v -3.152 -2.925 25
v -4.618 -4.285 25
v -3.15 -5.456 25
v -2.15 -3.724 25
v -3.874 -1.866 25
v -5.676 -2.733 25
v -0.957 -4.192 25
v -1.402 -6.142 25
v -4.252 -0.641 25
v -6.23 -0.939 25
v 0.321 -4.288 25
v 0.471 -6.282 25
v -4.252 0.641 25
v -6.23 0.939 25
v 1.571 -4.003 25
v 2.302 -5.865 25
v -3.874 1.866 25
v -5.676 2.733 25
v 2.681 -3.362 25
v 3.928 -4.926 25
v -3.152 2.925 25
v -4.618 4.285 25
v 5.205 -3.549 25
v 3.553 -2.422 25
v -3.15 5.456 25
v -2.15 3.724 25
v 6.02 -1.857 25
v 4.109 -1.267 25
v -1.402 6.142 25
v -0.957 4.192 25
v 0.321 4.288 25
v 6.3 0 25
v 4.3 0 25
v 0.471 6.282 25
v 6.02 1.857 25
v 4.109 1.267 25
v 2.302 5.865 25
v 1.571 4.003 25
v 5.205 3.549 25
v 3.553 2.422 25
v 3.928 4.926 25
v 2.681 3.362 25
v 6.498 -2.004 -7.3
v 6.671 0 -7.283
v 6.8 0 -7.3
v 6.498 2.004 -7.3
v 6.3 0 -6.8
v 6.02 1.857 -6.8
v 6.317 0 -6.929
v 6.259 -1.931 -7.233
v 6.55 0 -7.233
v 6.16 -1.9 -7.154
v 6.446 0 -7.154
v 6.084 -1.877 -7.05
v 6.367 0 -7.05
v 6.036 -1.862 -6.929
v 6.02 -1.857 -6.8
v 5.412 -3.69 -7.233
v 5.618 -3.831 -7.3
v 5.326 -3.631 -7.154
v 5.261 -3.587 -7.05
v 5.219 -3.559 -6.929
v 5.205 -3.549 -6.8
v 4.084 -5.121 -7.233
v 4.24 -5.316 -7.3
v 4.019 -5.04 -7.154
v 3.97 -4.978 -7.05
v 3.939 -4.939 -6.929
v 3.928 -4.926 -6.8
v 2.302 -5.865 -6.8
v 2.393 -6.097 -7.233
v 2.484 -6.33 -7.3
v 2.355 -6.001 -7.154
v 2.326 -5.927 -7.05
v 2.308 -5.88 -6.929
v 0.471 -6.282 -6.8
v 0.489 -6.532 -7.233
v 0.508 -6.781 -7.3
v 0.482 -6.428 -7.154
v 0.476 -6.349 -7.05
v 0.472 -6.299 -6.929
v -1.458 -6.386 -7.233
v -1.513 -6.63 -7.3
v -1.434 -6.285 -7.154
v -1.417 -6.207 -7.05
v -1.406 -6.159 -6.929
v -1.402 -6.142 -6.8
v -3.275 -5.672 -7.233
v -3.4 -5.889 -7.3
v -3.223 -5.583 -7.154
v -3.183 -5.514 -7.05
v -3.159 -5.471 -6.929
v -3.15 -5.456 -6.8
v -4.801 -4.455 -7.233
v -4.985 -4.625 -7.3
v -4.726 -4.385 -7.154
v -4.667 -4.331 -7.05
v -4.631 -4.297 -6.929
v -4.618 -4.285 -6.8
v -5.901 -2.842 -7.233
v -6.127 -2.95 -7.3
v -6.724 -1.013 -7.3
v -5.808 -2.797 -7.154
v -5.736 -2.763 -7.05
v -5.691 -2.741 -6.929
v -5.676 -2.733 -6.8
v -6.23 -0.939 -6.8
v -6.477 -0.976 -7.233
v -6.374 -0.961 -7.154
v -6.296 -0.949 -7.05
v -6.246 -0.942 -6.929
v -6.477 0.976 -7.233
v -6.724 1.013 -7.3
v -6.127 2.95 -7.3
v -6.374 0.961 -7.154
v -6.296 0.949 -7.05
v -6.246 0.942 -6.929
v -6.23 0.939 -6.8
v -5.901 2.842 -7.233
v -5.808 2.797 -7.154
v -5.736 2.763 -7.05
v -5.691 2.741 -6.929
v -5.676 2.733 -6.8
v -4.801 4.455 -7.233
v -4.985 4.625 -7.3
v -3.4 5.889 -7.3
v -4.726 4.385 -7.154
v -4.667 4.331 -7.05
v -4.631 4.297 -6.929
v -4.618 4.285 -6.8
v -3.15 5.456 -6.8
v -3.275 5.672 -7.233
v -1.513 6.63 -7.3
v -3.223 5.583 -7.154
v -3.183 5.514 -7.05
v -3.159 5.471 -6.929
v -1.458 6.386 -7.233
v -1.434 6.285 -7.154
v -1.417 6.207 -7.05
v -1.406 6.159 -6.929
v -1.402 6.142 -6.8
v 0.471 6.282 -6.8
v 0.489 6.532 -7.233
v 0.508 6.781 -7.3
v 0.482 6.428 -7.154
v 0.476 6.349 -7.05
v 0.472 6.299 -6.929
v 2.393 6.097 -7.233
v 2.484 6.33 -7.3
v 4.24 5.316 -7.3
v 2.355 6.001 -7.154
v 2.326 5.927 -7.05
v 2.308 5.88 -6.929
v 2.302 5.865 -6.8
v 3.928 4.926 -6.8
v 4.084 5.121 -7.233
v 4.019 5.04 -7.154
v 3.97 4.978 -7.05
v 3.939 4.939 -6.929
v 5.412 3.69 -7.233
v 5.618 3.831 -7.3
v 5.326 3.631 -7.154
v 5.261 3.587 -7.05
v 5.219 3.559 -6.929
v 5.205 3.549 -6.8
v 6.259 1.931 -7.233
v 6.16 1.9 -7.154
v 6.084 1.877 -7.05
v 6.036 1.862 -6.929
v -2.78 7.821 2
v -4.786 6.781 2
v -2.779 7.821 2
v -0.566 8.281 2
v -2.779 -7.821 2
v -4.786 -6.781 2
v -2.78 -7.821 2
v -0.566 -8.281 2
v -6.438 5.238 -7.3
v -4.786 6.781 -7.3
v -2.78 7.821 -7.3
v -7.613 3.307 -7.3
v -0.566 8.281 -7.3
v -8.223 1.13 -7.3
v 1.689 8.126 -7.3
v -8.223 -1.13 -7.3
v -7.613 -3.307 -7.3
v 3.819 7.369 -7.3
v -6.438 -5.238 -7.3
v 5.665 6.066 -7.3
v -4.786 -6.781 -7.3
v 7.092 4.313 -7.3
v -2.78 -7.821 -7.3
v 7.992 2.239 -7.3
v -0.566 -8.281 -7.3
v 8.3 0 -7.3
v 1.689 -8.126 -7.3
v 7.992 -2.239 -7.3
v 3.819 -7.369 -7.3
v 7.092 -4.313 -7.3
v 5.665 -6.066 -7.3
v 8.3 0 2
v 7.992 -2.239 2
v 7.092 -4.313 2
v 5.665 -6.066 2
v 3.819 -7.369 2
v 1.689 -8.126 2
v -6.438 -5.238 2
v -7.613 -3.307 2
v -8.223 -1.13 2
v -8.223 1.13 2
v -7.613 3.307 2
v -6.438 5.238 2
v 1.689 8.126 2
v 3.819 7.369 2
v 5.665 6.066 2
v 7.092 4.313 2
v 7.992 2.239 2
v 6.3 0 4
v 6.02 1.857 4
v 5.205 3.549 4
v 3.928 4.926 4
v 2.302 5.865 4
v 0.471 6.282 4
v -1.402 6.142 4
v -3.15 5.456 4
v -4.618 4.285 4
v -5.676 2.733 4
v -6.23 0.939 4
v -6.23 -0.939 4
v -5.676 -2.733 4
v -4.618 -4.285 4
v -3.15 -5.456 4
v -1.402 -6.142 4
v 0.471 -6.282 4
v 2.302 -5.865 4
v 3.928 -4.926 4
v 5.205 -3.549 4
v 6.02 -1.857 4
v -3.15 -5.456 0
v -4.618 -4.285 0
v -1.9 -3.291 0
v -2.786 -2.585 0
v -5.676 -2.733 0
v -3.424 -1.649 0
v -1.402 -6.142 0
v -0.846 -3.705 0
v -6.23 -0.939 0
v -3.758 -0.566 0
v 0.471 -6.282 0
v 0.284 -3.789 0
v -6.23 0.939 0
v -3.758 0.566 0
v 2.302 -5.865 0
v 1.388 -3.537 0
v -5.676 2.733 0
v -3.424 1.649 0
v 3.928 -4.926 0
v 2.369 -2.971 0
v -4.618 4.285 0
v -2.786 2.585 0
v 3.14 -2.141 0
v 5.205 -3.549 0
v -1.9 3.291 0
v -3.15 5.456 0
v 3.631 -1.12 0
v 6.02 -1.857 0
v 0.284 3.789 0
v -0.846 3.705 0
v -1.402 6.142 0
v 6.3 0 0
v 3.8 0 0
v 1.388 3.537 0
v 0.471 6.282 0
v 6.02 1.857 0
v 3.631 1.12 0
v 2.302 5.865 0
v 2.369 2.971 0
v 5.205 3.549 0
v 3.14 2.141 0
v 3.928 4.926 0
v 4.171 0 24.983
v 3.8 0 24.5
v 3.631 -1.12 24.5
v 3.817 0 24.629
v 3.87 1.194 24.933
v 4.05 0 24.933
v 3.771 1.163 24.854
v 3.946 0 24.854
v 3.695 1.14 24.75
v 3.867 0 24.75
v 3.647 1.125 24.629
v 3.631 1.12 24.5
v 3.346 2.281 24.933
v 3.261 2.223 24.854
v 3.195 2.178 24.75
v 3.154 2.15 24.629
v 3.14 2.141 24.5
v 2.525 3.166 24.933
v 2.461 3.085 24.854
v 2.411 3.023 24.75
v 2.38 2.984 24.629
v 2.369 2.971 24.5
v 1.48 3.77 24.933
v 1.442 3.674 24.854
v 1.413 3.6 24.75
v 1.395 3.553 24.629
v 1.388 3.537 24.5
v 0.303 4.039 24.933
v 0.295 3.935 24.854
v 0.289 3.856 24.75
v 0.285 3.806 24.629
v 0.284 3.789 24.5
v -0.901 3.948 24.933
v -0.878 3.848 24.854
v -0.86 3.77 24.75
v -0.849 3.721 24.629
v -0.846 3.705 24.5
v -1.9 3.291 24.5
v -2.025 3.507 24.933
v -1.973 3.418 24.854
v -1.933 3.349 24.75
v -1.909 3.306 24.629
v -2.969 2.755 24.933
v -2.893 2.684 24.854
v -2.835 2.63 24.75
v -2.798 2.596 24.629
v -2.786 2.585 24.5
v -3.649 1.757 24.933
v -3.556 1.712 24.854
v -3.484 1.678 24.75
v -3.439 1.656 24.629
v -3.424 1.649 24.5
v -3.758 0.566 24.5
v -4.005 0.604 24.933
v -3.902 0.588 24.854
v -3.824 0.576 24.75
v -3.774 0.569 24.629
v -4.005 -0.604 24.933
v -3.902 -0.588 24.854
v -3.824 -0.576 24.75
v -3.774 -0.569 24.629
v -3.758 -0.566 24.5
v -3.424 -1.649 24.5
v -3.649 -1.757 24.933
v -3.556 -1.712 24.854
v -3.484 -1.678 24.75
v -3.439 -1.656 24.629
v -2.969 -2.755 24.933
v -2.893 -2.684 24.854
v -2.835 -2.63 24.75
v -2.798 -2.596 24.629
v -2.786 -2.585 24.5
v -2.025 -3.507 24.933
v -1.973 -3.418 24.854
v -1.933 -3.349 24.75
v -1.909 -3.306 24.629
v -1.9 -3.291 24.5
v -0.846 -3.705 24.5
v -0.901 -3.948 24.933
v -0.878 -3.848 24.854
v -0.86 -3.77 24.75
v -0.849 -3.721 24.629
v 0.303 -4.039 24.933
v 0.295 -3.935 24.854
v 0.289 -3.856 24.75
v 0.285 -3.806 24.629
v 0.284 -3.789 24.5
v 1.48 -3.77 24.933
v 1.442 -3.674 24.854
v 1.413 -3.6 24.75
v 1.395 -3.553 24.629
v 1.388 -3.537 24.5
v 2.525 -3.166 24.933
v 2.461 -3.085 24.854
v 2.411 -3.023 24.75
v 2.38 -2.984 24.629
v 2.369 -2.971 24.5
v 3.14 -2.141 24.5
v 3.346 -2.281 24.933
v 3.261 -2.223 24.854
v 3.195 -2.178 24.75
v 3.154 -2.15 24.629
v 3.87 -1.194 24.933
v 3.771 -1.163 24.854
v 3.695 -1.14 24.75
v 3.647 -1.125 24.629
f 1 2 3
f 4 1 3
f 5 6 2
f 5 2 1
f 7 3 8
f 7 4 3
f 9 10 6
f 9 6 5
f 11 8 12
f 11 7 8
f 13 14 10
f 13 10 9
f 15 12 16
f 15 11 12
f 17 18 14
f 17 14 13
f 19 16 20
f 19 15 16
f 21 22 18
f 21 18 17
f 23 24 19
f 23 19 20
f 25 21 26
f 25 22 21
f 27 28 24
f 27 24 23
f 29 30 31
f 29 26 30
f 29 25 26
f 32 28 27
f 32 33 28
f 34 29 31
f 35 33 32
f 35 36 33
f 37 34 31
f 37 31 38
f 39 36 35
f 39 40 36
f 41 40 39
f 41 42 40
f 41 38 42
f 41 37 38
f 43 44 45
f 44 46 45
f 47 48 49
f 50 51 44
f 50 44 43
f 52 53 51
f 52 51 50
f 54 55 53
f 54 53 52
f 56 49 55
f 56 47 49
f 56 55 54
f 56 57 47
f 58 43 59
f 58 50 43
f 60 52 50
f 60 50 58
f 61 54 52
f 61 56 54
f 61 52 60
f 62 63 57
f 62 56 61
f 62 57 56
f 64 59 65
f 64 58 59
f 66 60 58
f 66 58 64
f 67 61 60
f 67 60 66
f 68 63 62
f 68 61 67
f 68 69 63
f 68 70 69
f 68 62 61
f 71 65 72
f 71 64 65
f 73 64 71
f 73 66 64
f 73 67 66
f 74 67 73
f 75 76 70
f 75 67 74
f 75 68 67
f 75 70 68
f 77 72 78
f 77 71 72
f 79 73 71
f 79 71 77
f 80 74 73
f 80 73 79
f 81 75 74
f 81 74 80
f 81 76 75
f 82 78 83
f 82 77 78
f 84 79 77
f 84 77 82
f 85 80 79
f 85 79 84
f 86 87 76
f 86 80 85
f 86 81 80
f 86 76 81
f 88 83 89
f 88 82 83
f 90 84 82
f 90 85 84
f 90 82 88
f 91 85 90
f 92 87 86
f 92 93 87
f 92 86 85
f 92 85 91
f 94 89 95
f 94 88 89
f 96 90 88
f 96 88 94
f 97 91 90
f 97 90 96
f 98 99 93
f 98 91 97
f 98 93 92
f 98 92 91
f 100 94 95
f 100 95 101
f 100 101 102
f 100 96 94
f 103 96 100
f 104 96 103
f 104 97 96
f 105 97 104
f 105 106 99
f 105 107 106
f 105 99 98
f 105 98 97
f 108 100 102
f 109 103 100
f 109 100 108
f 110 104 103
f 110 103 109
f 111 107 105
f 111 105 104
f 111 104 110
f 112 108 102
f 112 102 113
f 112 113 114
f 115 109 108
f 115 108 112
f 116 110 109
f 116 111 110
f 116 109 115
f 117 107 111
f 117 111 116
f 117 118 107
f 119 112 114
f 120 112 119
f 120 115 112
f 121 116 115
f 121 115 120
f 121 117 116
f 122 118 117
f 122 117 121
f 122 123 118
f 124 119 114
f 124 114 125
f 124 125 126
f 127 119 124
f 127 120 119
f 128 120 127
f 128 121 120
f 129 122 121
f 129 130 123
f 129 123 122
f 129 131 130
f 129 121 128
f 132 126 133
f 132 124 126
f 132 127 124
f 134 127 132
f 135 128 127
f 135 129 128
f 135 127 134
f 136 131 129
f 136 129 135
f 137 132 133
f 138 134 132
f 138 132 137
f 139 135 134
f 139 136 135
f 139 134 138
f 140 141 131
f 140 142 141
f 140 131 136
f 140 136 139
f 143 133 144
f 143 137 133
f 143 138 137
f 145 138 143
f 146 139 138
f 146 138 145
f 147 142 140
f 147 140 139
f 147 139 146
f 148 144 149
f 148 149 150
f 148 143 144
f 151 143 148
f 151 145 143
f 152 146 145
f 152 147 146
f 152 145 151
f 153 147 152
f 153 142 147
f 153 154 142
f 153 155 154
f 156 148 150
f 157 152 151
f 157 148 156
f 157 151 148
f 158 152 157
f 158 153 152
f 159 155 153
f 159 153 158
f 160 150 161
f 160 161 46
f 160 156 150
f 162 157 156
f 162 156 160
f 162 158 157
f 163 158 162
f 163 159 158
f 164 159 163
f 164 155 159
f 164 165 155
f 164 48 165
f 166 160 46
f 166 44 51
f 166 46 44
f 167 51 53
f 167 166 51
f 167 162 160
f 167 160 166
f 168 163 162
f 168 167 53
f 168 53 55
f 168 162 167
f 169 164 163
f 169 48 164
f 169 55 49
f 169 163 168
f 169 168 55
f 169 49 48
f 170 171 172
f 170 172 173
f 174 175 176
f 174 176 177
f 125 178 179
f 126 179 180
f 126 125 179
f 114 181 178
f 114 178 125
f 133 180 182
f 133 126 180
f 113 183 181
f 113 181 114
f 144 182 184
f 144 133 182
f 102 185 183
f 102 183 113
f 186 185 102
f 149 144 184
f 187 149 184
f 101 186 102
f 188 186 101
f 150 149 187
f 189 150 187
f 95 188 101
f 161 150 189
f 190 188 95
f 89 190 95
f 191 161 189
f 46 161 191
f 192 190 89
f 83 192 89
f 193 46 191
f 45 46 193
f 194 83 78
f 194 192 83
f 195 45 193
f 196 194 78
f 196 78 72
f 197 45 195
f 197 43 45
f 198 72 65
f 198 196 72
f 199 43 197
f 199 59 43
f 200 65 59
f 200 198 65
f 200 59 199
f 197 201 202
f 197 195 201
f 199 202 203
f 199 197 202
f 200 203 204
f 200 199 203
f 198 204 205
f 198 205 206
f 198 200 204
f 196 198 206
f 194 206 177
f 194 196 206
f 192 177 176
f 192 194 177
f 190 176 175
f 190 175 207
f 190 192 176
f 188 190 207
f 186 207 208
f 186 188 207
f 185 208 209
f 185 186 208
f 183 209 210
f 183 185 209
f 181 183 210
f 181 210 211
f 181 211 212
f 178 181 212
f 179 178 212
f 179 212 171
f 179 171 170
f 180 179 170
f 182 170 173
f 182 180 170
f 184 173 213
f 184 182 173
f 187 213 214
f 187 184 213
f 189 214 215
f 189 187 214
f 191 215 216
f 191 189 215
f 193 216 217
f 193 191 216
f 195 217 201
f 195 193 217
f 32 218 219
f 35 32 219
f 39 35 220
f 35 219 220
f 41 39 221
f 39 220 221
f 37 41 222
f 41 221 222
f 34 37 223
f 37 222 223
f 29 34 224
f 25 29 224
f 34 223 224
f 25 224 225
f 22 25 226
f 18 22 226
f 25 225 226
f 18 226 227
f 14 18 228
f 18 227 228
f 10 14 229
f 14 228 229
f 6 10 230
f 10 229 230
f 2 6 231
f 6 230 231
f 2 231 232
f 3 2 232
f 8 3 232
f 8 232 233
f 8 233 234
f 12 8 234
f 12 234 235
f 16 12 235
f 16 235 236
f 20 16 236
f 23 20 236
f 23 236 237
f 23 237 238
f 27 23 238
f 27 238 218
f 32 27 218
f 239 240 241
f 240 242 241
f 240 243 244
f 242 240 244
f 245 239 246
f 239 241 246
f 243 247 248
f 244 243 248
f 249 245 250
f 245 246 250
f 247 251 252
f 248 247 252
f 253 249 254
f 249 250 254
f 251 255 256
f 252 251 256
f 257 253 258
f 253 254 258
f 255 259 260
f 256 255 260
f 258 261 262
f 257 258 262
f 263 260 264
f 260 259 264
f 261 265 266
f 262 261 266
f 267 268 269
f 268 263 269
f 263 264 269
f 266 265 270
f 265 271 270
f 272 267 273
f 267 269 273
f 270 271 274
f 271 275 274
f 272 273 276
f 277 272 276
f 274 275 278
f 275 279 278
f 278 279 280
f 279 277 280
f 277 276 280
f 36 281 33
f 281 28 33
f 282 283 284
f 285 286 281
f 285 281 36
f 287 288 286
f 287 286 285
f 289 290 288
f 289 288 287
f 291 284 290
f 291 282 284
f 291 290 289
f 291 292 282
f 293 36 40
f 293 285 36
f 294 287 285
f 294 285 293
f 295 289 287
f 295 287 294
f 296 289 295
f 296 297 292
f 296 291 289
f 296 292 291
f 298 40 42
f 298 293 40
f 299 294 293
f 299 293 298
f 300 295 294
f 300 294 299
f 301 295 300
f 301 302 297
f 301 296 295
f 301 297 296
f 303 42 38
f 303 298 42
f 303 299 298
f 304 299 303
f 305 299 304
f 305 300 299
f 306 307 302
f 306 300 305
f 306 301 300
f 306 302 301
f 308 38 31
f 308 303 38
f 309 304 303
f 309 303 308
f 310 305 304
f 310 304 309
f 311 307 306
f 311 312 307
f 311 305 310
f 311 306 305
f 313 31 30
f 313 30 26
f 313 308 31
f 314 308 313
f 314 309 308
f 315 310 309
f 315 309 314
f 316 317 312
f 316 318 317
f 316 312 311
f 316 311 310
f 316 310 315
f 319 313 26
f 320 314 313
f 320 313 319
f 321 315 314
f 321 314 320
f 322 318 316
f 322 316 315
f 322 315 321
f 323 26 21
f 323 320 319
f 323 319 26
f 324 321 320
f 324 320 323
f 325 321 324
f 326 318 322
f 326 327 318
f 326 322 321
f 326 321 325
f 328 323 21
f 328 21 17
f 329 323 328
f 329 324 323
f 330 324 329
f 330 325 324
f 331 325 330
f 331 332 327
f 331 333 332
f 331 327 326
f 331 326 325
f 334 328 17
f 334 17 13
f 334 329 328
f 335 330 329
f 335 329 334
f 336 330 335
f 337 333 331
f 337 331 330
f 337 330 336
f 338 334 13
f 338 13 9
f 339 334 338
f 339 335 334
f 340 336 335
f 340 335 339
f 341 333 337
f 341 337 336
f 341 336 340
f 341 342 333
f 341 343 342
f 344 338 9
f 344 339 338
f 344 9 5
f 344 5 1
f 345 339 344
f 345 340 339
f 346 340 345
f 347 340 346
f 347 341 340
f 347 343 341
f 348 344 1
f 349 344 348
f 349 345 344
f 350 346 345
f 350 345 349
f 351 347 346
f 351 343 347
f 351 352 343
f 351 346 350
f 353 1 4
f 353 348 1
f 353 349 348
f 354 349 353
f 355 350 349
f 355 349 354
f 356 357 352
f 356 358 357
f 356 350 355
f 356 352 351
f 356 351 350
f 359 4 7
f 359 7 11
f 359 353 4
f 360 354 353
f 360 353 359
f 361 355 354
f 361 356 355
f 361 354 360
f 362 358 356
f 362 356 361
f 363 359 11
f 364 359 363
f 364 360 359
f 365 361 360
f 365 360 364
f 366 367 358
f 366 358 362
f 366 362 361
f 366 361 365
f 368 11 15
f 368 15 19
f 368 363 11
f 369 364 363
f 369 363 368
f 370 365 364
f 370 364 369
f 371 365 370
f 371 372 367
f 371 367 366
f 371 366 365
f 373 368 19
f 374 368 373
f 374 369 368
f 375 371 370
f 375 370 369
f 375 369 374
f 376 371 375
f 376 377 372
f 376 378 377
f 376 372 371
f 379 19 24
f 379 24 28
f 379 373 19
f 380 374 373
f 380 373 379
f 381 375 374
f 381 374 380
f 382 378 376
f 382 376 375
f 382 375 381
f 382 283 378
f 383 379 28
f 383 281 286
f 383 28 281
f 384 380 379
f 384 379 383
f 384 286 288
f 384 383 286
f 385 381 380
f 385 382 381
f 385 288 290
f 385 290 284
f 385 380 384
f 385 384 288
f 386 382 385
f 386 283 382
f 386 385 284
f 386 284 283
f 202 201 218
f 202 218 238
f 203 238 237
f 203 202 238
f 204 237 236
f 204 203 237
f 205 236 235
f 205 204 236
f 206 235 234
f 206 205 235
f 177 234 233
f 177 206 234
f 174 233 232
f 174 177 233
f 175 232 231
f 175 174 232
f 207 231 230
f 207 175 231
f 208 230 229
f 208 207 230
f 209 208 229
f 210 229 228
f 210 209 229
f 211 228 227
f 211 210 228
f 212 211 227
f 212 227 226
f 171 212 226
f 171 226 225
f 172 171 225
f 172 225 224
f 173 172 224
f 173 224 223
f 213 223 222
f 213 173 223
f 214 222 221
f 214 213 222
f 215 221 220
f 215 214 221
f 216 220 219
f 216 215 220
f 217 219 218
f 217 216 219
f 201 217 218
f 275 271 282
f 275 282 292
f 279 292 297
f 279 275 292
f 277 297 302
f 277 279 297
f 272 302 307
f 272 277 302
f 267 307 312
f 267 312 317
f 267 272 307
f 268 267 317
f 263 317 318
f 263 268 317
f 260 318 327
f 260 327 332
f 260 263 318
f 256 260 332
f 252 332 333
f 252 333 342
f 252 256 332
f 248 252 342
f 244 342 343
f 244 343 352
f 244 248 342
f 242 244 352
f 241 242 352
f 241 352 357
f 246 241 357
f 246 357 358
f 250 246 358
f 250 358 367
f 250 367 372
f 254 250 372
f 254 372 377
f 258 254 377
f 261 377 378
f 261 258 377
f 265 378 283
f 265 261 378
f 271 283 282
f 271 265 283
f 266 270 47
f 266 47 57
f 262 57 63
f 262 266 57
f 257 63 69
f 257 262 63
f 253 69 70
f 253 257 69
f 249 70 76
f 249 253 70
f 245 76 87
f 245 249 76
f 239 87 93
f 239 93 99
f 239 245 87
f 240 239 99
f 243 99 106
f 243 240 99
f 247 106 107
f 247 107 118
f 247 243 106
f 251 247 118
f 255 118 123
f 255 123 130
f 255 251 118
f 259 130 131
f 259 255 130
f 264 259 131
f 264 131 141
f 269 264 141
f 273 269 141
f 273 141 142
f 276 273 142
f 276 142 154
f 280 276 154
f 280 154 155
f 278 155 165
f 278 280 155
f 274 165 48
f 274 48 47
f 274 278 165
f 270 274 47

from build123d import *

# Parameters (mm, degrees)
F0_R          = 6.3
F0_R_2        = 3.8
F1_DEPTH      = 25
F2_R          = 8.3
F2_R_2        = 6.3
F3_DEPTH      = 7.3
F3_DEPTH_BACK = 2
F4_SIZE       = 1.99999
F5_R          = 0.5


# Not quite as in the source:
# - a fillet or chamfer is up to 0.001 mm smaller than in the source, because OpenCascade refuses the exact size


with BuildPart() as f1:
    # F0 (on Top) → F1 (new body)
    with BuildSketch(Plane.XY):
        Circle(F0_R)
        Circle(F0_R_2, mode=Mode.SUBTRACT)
    extrude(amount=F1_DEPTH)

    # F2 (on face) → F3 (join, two sides)
    with BuildSketch(Plane(origin=(0, 0, 0), x_dir=(1, 0, 0), z_dir=(0, 0, -1))) as f3_sk:
        Circle(F2_R)
        Circle(F2_R_2, mode=Mode.SUBTRACT)
    extrude(amount=F3_DEPTH)
    extrude(f3_sk.sketch, amount=-F3_DEPTH_BACK)

    # F4 (size 2 in the source; OpenCascade refuses exactly that, so slightly less here)
    f4_edges = [f1.edges().sort_by_distance(p)[0] for p in [
        (-6.3, 0, 2),
    ]]
    chamfer(f4_edges, length=F4_SIZE)

    # F5
    f5_edges = [f1.edges().sort_by_distance(p)[0] for p in [
        (-3.8, 0, 25),
        (-6.3, 0, -7.3),
    ]]
    fillet(f5_edges, radius=F5_R)


solid = f1.part
